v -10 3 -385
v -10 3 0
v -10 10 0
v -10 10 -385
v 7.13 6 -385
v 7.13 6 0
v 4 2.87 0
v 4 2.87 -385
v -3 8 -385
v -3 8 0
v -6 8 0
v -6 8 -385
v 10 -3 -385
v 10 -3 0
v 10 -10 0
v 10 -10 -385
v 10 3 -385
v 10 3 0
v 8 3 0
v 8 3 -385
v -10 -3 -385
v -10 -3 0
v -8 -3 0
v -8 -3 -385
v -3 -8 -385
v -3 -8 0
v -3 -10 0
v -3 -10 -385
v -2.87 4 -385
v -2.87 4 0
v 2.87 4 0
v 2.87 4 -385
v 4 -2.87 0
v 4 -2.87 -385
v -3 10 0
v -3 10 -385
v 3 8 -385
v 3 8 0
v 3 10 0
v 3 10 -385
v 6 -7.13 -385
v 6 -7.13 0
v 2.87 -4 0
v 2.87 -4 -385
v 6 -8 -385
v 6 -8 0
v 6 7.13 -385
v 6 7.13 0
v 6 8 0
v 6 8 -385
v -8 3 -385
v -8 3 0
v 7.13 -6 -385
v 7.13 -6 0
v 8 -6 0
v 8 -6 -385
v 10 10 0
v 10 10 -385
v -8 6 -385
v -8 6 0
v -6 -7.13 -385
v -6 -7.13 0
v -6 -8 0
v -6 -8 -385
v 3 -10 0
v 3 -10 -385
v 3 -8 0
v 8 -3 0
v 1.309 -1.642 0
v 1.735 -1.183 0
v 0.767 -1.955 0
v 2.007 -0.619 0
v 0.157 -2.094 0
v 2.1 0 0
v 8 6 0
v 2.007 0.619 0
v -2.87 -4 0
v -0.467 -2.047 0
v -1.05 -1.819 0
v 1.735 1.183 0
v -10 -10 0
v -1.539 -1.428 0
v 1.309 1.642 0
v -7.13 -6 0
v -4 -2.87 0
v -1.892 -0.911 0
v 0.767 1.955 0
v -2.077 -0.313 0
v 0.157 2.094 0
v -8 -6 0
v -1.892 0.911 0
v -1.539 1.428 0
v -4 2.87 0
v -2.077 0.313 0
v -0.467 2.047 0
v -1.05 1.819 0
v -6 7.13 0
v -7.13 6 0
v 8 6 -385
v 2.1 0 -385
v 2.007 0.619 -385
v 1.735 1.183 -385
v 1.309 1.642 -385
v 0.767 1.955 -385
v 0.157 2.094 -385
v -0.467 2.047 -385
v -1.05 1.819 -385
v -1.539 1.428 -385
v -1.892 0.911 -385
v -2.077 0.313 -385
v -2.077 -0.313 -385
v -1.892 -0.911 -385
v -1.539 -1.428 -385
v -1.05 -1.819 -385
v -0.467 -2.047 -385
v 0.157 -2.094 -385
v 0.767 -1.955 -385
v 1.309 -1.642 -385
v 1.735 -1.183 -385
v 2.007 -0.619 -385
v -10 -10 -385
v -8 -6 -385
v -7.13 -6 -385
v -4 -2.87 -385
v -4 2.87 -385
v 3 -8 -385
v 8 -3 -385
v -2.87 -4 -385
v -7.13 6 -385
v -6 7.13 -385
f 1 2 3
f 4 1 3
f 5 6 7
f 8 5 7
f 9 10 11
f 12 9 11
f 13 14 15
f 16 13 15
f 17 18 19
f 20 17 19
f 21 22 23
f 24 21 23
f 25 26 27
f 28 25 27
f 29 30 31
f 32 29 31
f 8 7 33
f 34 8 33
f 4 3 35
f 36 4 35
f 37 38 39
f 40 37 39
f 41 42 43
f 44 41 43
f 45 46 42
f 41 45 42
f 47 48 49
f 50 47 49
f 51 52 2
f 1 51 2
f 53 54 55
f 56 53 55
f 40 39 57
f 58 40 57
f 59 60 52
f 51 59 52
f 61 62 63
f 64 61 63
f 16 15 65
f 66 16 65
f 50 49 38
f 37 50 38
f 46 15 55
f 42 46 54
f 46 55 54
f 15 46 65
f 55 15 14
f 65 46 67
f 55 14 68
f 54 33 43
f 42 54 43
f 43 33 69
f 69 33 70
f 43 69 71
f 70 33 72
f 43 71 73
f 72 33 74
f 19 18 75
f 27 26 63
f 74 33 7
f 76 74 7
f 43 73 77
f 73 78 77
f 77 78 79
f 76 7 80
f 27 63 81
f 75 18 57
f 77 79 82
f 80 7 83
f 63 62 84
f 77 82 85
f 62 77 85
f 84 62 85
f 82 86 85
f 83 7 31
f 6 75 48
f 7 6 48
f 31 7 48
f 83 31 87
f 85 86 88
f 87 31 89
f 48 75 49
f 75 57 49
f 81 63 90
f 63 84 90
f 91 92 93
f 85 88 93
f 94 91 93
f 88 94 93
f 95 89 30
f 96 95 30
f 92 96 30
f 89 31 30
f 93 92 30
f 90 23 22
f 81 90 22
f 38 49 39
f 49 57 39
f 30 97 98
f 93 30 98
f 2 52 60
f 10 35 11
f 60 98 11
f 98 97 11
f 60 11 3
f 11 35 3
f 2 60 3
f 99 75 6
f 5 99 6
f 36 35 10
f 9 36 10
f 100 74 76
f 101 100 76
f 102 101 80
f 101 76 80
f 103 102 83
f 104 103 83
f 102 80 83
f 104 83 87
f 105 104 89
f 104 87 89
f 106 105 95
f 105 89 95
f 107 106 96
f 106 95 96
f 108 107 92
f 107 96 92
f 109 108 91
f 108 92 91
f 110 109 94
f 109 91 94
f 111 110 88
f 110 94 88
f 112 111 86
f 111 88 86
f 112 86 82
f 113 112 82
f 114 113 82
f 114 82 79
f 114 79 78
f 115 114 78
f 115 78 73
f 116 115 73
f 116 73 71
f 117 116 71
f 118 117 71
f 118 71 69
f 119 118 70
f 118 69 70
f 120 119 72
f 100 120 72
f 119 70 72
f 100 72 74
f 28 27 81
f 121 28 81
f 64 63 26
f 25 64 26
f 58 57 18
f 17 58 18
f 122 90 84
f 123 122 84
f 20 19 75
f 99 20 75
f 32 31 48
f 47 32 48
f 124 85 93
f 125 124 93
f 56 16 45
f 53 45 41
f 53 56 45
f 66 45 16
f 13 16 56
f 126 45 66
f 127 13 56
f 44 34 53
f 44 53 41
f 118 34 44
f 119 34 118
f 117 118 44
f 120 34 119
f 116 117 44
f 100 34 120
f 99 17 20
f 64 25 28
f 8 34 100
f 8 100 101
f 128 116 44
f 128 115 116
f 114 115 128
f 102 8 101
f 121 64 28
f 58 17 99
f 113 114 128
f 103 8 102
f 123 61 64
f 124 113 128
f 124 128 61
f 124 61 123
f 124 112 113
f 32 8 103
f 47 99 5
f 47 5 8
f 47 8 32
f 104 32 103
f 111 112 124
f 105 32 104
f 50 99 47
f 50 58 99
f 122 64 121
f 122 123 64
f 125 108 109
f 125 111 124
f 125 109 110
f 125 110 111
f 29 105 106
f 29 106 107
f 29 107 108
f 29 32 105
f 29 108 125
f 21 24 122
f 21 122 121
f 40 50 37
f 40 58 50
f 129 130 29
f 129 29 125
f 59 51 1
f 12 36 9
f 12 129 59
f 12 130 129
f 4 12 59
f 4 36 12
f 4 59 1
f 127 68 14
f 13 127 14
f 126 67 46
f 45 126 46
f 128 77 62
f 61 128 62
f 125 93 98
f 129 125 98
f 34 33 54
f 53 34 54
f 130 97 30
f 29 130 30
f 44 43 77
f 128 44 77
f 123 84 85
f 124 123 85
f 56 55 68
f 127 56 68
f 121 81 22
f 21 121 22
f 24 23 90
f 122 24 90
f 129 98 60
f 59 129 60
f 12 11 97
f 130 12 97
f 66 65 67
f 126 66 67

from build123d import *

# Parameters (mm, degrees)
CROQUIS1_R              = 2.1
SALIENTE_EXTRUIR2_DEPTH = 385


with BuildPart() as part:
    # Croquis1 → Saliente-Extruir2 (new body)
    with BuildSketch(Plane.XY):
        Polygon((-3, 10), (-3, 8), (-6, 8), (-6, 7.13), (-2.87, 4), (2.87, 4), (6, 7.13), (6, 8), (3, 8), (3, 10), (10, 10), (10, 3), (8, 3), (8, 6), (7.13, 6), (4, 2.87), (4, -2.87), (7.13, -6), (8, -6), (8, -3), (10, -3), (10, -10), (3, -10), (3, -8), (6, -8), (6, -7.13), (2.87, -4), (-2.87, -4), (-6, -7.13), (-6, -8), (-3, -8), (-3, -10), (-10, -10), (-10, -3), (-8, -3), (-8, -6), (-7.13, -6), (-4, -2.87), (-4, 2.87), (-7.13, 6), (-8, 6), (-8, 3), (-10, 3), (-10, 10), align=None)
        Circle(CROQUIS1_R, mode=Mode.SUBTRACT)
    extrude(amount=-SALIENTE_EXTRUIR2_DEPTH)


solid = part.part
